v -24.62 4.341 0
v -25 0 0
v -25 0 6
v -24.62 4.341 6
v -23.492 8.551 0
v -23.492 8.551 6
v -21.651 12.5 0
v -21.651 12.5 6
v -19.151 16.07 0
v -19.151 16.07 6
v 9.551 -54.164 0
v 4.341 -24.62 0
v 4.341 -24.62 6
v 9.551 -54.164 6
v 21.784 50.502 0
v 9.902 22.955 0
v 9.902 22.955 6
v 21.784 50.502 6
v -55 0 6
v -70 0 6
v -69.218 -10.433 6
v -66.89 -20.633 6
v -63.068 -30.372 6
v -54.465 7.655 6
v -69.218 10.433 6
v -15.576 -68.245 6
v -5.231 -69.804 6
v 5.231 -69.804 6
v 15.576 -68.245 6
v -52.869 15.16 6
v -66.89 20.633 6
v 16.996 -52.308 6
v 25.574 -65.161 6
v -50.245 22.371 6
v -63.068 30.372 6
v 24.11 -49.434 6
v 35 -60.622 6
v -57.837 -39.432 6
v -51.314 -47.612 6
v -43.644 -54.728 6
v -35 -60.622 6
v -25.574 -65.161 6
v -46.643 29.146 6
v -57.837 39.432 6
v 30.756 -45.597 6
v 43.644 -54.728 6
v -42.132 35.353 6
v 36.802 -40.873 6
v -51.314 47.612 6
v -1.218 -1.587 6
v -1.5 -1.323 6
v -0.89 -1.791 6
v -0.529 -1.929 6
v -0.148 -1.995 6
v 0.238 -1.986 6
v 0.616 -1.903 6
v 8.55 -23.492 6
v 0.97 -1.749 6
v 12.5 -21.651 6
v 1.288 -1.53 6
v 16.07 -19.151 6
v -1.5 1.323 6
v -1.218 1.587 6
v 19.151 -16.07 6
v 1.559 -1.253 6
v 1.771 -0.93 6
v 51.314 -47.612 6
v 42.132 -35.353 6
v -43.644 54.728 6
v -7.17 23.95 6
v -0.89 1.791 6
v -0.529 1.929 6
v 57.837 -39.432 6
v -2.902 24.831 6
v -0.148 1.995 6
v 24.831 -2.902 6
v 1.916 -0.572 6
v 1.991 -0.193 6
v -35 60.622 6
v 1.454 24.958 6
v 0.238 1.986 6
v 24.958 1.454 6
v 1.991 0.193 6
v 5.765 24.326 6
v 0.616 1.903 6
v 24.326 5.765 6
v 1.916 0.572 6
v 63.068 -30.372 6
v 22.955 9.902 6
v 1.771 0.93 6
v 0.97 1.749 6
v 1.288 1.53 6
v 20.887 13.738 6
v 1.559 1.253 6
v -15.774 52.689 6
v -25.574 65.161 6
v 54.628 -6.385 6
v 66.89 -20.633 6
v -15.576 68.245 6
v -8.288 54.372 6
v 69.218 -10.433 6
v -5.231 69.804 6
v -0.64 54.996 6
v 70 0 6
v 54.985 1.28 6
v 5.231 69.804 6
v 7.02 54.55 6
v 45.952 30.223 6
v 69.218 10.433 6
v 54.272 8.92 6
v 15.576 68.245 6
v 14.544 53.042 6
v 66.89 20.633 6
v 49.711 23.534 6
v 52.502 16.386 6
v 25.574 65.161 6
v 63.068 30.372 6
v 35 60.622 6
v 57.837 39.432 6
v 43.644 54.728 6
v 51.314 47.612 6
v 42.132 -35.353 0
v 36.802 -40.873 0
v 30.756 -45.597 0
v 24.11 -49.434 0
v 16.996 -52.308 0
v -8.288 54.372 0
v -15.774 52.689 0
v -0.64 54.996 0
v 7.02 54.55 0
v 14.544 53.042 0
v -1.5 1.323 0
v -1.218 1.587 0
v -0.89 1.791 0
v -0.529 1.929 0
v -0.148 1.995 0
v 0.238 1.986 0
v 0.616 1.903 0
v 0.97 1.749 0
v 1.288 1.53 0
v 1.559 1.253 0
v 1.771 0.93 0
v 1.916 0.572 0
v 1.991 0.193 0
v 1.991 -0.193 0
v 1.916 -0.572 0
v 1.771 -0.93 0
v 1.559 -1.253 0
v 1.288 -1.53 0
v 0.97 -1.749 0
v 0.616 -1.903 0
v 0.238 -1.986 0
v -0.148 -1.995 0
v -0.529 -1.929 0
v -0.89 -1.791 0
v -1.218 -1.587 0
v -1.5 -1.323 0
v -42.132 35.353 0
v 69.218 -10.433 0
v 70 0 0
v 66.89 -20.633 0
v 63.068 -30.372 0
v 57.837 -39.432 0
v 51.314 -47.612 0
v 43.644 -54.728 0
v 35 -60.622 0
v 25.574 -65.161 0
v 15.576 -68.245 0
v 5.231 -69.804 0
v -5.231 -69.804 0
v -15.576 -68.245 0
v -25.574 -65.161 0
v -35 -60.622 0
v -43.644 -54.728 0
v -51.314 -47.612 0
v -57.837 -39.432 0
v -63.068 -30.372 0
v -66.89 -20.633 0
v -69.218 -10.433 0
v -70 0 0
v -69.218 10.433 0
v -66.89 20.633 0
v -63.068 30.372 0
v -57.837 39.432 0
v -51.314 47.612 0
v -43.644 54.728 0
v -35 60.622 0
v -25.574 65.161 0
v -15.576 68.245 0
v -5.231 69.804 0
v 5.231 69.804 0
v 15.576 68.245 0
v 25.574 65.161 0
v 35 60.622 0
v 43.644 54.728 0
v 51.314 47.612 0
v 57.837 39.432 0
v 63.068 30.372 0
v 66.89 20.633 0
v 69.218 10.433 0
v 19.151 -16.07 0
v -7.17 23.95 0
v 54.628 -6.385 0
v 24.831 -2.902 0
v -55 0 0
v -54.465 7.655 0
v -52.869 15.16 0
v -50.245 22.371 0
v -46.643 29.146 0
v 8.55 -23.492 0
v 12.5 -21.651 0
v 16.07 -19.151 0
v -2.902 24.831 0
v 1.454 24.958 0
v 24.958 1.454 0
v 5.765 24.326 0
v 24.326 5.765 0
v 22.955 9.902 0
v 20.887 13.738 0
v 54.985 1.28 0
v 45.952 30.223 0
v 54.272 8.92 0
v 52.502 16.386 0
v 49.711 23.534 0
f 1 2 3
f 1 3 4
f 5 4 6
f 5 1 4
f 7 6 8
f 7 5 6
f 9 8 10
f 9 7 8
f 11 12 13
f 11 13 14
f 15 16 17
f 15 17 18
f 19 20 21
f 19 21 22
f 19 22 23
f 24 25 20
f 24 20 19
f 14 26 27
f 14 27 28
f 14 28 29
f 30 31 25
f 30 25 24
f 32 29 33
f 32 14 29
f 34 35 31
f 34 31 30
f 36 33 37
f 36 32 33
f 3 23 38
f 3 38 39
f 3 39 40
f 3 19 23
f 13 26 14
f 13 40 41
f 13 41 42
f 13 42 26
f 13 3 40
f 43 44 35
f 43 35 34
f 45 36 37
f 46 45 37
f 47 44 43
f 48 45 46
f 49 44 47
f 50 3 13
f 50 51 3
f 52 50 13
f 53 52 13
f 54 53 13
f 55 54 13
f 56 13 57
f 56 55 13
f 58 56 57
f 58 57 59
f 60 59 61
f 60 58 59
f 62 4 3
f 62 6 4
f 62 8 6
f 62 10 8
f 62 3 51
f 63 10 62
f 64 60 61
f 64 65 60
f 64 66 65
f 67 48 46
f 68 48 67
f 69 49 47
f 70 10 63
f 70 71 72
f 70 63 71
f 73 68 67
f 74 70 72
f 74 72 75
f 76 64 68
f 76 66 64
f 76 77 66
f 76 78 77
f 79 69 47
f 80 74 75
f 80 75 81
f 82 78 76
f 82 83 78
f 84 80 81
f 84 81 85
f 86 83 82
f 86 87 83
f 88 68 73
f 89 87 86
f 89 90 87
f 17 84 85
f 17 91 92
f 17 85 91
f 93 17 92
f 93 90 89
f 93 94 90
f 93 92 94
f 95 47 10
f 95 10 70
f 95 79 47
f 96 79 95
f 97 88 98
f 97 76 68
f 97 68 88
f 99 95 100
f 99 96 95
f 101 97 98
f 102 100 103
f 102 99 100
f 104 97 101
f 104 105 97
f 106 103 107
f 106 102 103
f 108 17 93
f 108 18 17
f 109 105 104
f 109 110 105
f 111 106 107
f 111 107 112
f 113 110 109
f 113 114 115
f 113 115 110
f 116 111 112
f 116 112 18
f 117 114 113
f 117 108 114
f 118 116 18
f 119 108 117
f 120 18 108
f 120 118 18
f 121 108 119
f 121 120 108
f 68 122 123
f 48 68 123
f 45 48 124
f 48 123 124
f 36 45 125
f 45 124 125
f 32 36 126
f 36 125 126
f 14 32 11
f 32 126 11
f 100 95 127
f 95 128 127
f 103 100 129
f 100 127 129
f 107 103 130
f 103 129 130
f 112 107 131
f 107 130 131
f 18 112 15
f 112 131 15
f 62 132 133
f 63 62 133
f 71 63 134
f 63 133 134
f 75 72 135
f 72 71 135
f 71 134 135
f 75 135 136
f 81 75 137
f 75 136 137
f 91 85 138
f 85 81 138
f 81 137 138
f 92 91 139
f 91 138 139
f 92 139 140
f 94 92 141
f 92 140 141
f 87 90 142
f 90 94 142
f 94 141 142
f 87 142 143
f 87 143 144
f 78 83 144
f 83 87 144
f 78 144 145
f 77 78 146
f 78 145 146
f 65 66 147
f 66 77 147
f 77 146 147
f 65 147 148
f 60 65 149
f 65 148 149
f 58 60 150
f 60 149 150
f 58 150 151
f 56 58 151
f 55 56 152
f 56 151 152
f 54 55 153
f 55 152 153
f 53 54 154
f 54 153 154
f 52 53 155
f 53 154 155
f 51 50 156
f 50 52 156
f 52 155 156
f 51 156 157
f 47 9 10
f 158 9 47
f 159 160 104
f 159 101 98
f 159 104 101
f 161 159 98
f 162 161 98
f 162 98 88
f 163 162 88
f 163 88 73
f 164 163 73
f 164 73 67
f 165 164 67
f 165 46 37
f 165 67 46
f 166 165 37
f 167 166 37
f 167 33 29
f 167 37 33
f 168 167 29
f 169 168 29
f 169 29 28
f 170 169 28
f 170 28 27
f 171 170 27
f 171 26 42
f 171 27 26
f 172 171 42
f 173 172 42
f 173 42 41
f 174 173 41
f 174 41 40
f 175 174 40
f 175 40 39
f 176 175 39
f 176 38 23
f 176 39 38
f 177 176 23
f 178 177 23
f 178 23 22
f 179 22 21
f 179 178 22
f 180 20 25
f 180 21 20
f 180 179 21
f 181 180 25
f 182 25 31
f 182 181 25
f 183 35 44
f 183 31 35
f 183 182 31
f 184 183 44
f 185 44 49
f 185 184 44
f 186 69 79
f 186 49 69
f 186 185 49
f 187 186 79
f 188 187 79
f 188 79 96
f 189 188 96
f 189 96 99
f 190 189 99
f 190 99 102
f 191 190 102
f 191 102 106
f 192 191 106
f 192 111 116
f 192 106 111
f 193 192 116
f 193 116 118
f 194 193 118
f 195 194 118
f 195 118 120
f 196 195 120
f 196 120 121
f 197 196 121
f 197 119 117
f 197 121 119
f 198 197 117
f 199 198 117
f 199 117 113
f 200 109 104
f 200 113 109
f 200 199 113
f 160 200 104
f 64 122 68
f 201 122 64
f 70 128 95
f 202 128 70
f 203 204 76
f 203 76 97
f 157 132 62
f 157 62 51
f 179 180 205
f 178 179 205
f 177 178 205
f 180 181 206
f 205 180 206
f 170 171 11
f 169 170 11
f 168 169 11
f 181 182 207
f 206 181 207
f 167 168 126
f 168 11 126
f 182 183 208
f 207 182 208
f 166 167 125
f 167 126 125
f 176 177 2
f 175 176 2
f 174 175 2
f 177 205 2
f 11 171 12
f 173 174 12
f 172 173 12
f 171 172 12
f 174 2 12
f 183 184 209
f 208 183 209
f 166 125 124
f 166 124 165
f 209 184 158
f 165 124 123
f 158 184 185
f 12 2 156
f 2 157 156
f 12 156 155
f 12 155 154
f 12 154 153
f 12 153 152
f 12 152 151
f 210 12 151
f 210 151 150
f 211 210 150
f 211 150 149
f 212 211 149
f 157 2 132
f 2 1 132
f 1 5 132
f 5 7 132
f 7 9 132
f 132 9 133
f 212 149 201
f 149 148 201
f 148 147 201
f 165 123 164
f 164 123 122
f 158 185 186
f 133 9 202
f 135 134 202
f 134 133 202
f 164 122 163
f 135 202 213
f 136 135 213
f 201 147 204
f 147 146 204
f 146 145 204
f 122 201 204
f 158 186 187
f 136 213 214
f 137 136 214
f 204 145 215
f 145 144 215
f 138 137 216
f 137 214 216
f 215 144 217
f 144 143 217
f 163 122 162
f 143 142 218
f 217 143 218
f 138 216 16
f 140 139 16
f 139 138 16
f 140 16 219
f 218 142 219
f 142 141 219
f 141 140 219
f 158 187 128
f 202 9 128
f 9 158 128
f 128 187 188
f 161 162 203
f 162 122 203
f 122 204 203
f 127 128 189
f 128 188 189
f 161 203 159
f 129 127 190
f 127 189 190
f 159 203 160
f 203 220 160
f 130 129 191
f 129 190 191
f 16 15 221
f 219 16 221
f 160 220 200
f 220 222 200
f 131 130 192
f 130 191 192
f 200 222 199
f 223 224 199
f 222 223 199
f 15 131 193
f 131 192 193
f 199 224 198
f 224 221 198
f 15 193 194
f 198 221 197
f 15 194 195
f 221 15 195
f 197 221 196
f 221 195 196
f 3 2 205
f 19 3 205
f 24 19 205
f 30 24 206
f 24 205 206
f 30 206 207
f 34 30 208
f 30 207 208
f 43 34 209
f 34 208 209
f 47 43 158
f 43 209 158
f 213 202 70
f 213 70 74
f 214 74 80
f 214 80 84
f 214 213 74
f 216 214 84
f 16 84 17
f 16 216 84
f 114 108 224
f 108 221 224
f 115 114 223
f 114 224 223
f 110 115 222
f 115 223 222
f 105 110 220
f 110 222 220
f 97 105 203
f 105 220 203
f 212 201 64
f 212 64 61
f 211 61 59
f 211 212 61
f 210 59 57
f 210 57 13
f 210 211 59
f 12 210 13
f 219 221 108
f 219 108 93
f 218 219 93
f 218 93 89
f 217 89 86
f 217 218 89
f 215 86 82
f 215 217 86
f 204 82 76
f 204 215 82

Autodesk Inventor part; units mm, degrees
ref_plane "YZ Plane" through (0, 0, 0) normal (1, 0, 0) x (0, 1, 0)
ref_plane "XZ Plane" through (0, 0, 0) normal (0, 1, 0) x (-1, 0, 0)
ref_plane "XY Plane" through (0, 0, 0) normal (0, 0, 1) x (1, 0, 0)
sketch "Sketch1" plane through (0, 0, 0) normal (0, 0, 1) x (1, 0, 0)
  arc A0 (-1.5, -1.3229) -> (-1.5, 1.3229) centre (0, 0) ccw
  line L0 (-1.5, 1.3229) -> (-1.5, -1.3229)
  circle A1 centre (0, 0) radius 70
  dimension "d0" = 4
  dimension "d1" = 1.5
  dimension "d2" = 140
extrude "Extrusion1" add sketch "Sketch1" along normal blind 6
sketch "Sketch2" plane through (0, 0, 0) normal (0, 0, -1) x (-1, 0, 0)
  circle A0 centre (0, 0) radius 70 construction
  arc A1 (1.5, 1.3229) -> (1.5, -1.3229) centre (0, 0) ccw construction
  circle A2 centre (0, 0) radius 70
  line L0 (1.5, -1.3229) -> (1.5, 1.3229) construction
  arc A3 (1.5, 1.3229) -> (1.5, -1.3229) centre (0, 0) ccw construction
  line L1 (0, 0) -> (-1.5321, 1.2856)
  arc A4 (55, 0) -> (42.1324, 35.3533) centre (0, 0) ccw
  line L2 (0, 0) -> (1.5, 0) construction
  line L3 (25, 0) -> (55, 0) construction
  line L4 (0, 0) -> (1.5, 1.2586)
  line L5 (19.1511, 16.0697) -> (42.1324, 35.3533)
  line L6 (0, 0) -> (1.5, 0) construction
  line L7 (25, 0) -> (55, 0) construction
  line L8 (0, 0) -> (1.5, 0)
  line L9 (25, 0) -> (70, 0)
  line L10 (55, 0) -> (25, 0)
  line L11 (-9.902, 22.9554) -> (-21.7844, 50.5019)
  line L12 (15.7742, 52.6894) -> (7.1701, 23.9497)
  arc A5 (15.7742, 52.6894) -> (-21.7844, 50.5019) centre (0, 0) ccw
  line L13 (-24.831, -2.9023) -> (-54.6281, -6.3851)
  line L14 (-45.9518, 30.223) -> (-20.8872, 13.7377)
  arc A6 (-45.9518, 30.223) -> (-54.6281, -6.3851) centre (0, 0) ccw
  line L15 (-4.3412, -24.6202) -> (-9.5506, -54.1644)
  line L16 (-42.1324, -35.3533) -> (-19.1511, -16.0697)
  arc A7 (-42.1324, -35.3533) -> (-9.5506, -54.1644) centre (0, 0) ccw
  arc A8 (-19.1511, -16.0697) -> (-4.3412, -24.6202) centre (0, 0) ccw
  arc A9 (-20.8872, 13.7377) -> (-24.831, -2.9023) centre (0, 0) ccw
  arc A10 (25, 0) -> (19.1511, 16.0697) centre (0, 0) ccw
  arc A11 (7.1701, 23.9497) -> (-9.902, 22.9554) centre (0, 0) ccw
  dimension "d10" = 110
  dimension "d13" = 220
extrude "Extrusion4" cut sketch "Sketch2" against normal through all contours L9 A10 L5 A4 | L11 A5 L12 A11 | L13 A6 L14 A9 | L15 A7 L16 A8
properties part number "back_cir_hold2"
